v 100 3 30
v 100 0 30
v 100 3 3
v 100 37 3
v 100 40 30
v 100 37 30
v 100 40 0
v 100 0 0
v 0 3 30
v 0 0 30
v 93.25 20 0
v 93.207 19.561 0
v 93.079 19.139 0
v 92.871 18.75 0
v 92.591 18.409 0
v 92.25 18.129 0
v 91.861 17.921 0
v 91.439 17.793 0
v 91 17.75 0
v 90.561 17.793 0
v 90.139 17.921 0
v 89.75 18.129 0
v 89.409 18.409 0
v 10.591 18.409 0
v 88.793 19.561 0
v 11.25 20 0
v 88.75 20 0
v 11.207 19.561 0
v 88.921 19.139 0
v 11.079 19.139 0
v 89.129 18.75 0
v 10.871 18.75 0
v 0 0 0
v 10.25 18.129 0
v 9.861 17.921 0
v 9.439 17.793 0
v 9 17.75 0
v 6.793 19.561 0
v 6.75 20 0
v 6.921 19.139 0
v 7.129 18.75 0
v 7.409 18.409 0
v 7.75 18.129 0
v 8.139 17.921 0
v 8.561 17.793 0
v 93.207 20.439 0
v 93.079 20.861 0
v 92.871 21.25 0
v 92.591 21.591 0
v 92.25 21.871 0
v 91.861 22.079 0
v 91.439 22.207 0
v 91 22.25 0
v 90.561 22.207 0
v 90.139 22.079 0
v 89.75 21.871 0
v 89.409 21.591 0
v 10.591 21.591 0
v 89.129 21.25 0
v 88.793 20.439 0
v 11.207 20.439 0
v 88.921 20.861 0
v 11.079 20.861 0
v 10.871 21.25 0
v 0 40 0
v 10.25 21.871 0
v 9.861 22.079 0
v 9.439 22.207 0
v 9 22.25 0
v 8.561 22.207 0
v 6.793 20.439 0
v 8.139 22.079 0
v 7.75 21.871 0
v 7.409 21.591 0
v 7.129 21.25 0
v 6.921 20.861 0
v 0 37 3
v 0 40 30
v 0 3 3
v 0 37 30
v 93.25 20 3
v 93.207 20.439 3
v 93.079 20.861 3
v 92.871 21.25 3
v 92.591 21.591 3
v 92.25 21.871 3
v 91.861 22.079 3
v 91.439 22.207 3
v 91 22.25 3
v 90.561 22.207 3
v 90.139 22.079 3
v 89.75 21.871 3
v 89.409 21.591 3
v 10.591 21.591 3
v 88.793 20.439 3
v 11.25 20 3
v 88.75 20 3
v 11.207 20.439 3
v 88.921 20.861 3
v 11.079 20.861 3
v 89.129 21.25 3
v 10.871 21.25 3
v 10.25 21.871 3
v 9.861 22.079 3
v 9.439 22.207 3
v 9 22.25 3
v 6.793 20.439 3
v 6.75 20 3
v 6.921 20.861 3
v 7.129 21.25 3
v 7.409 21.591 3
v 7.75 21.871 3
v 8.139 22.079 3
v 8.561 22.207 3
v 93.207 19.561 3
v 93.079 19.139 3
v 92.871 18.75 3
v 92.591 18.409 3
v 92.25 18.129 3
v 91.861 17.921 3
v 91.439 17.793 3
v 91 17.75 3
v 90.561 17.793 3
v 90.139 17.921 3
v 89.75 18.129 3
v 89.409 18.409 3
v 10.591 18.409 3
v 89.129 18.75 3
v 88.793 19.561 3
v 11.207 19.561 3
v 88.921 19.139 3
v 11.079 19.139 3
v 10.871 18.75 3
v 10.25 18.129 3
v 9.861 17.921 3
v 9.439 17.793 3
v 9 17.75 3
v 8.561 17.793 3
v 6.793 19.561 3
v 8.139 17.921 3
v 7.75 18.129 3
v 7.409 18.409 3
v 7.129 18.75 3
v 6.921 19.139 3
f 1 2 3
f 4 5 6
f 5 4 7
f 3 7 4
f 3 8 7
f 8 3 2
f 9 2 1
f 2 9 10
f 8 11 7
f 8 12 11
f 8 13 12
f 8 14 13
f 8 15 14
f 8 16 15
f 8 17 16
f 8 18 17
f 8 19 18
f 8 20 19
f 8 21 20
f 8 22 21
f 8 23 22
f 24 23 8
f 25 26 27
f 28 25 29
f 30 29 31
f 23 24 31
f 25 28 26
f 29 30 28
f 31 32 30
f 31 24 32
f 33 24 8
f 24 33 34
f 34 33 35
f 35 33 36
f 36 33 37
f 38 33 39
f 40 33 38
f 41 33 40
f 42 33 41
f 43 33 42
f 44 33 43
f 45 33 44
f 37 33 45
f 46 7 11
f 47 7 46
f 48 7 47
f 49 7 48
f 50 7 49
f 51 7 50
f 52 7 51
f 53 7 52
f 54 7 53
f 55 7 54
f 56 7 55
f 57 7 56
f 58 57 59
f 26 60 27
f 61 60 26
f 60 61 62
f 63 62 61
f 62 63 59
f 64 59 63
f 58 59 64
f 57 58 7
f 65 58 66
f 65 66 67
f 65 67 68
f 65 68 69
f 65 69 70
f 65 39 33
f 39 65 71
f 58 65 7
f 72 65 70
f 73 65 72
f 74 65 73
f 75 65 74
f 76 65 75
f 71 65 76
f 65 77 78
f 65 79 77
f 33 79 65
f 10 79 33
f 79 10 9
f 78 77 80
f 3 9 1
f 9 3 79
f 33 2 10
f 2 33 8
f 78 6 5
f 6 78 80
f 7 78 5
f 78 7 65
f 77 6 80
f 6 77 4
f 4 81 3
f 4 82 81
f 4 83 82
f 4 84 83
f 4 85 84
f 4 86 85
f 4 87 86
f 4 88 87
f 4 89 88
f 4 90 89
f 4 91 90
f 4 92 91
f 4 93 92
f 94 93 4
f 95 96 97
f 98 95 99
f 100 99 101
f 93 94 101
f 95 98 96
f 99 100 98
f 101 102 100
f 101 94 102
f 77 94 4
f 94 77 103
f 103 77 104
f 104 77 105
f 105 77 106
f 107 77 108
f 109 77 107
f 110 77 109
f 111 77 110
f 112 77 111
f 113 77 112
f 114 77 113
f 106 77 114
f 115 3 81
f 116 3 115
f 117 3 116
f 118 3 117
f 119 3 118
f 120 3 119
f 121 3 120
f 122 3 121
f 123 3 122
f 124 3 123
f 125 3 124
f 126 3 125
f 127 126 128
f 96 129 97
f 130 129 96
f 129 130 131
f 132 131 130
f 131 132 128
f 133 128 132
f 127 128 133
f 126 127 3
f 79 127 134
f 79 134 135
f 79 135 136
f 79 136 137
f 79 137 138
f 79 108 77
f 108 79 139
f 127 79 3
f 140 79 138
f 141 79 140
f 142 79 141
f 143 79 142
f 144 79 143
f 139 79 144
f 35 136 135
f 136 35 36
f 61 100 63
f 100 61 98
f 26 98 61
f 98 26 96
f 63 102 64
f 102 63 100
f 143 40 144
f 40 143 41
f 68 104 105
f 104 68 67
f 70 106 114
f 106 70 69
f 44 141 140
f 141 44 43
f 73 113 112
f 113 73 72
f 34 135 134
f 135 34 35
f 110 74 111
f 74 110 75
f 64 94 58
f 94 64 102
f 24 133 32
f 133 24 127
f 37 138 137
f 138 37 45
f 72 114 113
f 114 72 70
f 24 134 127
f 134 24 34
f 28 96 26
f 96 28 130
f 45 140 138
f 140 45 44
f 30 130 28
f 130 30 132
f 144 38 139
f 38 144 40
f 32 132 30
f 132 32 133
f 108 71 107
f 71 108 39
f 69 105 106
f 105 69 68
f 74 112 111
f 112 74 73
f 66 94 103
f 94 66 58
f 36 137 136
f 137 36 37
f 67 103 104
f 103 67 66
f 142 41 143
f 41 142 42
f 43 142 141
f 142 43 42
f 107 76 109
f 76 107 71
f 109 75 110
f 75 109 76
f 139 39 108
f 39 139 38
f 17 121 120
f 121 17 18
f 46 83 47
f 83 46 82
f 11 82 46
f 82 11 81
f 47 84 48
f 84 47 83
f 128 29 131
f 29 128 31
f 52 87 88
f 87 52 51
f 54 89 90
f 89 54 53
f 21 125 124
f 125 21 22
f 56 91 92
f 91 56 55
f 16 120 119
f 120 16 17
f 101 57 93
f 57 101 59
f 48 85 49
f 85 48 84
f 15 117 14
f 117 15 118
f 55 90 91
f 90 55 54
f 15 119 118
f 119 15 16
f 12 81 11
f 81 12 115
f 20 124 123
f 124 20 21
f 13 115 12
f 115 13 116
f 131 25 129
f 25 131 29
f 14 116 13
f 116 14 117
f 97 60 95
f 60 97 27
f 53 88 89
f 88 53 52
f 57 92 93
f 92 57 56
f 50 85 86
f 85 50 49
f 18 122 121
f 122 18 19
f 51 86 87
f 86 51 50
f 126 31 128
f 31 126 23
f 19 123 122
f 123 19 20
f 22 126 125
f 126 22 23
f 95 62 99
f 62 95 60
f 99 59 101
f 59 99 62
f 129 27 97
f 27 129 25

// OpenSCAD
$fn = 32;

// ----------------------------------------------------------------------
// U-bracket: 100 x 40 x 30 mm
// ----------------------------------------------------------------------

// --- parameters (mm) ---
rail_len = 100;           // outer length, X
jaw_w = 40;               // outer width, Y
jaw_h = 30;               // upright height, Z
web_t = 3;                // wall thickness
hole_d = 4.5;             // clearance for M4

module hole_z(px, py) {
  translate([px, py, -2.5]) cylinder(h = web_t + 5, d = hole_d);
}
module hole_y_pz(pz) {
  /* through both uprights along Y */
  translate([0, -2.5, pz]) rotate([-90, 0, 0]) cylinder(h = jaw_w + 5, d = hole_d);
}

module base() {
  cube([rail_len, jaw_w, web_t]);
}

module uprights() {
  cube([rail_len, web_t, jaw_h]);
  translate([0, jaw_w - web_t, 0]) cube([rail_len, web_t, jaw_h]);
}

difference() {
  union() {
    base();
    uprights();
  }
  hole_z(9, 20);
  hole_z(91, 20);
}
